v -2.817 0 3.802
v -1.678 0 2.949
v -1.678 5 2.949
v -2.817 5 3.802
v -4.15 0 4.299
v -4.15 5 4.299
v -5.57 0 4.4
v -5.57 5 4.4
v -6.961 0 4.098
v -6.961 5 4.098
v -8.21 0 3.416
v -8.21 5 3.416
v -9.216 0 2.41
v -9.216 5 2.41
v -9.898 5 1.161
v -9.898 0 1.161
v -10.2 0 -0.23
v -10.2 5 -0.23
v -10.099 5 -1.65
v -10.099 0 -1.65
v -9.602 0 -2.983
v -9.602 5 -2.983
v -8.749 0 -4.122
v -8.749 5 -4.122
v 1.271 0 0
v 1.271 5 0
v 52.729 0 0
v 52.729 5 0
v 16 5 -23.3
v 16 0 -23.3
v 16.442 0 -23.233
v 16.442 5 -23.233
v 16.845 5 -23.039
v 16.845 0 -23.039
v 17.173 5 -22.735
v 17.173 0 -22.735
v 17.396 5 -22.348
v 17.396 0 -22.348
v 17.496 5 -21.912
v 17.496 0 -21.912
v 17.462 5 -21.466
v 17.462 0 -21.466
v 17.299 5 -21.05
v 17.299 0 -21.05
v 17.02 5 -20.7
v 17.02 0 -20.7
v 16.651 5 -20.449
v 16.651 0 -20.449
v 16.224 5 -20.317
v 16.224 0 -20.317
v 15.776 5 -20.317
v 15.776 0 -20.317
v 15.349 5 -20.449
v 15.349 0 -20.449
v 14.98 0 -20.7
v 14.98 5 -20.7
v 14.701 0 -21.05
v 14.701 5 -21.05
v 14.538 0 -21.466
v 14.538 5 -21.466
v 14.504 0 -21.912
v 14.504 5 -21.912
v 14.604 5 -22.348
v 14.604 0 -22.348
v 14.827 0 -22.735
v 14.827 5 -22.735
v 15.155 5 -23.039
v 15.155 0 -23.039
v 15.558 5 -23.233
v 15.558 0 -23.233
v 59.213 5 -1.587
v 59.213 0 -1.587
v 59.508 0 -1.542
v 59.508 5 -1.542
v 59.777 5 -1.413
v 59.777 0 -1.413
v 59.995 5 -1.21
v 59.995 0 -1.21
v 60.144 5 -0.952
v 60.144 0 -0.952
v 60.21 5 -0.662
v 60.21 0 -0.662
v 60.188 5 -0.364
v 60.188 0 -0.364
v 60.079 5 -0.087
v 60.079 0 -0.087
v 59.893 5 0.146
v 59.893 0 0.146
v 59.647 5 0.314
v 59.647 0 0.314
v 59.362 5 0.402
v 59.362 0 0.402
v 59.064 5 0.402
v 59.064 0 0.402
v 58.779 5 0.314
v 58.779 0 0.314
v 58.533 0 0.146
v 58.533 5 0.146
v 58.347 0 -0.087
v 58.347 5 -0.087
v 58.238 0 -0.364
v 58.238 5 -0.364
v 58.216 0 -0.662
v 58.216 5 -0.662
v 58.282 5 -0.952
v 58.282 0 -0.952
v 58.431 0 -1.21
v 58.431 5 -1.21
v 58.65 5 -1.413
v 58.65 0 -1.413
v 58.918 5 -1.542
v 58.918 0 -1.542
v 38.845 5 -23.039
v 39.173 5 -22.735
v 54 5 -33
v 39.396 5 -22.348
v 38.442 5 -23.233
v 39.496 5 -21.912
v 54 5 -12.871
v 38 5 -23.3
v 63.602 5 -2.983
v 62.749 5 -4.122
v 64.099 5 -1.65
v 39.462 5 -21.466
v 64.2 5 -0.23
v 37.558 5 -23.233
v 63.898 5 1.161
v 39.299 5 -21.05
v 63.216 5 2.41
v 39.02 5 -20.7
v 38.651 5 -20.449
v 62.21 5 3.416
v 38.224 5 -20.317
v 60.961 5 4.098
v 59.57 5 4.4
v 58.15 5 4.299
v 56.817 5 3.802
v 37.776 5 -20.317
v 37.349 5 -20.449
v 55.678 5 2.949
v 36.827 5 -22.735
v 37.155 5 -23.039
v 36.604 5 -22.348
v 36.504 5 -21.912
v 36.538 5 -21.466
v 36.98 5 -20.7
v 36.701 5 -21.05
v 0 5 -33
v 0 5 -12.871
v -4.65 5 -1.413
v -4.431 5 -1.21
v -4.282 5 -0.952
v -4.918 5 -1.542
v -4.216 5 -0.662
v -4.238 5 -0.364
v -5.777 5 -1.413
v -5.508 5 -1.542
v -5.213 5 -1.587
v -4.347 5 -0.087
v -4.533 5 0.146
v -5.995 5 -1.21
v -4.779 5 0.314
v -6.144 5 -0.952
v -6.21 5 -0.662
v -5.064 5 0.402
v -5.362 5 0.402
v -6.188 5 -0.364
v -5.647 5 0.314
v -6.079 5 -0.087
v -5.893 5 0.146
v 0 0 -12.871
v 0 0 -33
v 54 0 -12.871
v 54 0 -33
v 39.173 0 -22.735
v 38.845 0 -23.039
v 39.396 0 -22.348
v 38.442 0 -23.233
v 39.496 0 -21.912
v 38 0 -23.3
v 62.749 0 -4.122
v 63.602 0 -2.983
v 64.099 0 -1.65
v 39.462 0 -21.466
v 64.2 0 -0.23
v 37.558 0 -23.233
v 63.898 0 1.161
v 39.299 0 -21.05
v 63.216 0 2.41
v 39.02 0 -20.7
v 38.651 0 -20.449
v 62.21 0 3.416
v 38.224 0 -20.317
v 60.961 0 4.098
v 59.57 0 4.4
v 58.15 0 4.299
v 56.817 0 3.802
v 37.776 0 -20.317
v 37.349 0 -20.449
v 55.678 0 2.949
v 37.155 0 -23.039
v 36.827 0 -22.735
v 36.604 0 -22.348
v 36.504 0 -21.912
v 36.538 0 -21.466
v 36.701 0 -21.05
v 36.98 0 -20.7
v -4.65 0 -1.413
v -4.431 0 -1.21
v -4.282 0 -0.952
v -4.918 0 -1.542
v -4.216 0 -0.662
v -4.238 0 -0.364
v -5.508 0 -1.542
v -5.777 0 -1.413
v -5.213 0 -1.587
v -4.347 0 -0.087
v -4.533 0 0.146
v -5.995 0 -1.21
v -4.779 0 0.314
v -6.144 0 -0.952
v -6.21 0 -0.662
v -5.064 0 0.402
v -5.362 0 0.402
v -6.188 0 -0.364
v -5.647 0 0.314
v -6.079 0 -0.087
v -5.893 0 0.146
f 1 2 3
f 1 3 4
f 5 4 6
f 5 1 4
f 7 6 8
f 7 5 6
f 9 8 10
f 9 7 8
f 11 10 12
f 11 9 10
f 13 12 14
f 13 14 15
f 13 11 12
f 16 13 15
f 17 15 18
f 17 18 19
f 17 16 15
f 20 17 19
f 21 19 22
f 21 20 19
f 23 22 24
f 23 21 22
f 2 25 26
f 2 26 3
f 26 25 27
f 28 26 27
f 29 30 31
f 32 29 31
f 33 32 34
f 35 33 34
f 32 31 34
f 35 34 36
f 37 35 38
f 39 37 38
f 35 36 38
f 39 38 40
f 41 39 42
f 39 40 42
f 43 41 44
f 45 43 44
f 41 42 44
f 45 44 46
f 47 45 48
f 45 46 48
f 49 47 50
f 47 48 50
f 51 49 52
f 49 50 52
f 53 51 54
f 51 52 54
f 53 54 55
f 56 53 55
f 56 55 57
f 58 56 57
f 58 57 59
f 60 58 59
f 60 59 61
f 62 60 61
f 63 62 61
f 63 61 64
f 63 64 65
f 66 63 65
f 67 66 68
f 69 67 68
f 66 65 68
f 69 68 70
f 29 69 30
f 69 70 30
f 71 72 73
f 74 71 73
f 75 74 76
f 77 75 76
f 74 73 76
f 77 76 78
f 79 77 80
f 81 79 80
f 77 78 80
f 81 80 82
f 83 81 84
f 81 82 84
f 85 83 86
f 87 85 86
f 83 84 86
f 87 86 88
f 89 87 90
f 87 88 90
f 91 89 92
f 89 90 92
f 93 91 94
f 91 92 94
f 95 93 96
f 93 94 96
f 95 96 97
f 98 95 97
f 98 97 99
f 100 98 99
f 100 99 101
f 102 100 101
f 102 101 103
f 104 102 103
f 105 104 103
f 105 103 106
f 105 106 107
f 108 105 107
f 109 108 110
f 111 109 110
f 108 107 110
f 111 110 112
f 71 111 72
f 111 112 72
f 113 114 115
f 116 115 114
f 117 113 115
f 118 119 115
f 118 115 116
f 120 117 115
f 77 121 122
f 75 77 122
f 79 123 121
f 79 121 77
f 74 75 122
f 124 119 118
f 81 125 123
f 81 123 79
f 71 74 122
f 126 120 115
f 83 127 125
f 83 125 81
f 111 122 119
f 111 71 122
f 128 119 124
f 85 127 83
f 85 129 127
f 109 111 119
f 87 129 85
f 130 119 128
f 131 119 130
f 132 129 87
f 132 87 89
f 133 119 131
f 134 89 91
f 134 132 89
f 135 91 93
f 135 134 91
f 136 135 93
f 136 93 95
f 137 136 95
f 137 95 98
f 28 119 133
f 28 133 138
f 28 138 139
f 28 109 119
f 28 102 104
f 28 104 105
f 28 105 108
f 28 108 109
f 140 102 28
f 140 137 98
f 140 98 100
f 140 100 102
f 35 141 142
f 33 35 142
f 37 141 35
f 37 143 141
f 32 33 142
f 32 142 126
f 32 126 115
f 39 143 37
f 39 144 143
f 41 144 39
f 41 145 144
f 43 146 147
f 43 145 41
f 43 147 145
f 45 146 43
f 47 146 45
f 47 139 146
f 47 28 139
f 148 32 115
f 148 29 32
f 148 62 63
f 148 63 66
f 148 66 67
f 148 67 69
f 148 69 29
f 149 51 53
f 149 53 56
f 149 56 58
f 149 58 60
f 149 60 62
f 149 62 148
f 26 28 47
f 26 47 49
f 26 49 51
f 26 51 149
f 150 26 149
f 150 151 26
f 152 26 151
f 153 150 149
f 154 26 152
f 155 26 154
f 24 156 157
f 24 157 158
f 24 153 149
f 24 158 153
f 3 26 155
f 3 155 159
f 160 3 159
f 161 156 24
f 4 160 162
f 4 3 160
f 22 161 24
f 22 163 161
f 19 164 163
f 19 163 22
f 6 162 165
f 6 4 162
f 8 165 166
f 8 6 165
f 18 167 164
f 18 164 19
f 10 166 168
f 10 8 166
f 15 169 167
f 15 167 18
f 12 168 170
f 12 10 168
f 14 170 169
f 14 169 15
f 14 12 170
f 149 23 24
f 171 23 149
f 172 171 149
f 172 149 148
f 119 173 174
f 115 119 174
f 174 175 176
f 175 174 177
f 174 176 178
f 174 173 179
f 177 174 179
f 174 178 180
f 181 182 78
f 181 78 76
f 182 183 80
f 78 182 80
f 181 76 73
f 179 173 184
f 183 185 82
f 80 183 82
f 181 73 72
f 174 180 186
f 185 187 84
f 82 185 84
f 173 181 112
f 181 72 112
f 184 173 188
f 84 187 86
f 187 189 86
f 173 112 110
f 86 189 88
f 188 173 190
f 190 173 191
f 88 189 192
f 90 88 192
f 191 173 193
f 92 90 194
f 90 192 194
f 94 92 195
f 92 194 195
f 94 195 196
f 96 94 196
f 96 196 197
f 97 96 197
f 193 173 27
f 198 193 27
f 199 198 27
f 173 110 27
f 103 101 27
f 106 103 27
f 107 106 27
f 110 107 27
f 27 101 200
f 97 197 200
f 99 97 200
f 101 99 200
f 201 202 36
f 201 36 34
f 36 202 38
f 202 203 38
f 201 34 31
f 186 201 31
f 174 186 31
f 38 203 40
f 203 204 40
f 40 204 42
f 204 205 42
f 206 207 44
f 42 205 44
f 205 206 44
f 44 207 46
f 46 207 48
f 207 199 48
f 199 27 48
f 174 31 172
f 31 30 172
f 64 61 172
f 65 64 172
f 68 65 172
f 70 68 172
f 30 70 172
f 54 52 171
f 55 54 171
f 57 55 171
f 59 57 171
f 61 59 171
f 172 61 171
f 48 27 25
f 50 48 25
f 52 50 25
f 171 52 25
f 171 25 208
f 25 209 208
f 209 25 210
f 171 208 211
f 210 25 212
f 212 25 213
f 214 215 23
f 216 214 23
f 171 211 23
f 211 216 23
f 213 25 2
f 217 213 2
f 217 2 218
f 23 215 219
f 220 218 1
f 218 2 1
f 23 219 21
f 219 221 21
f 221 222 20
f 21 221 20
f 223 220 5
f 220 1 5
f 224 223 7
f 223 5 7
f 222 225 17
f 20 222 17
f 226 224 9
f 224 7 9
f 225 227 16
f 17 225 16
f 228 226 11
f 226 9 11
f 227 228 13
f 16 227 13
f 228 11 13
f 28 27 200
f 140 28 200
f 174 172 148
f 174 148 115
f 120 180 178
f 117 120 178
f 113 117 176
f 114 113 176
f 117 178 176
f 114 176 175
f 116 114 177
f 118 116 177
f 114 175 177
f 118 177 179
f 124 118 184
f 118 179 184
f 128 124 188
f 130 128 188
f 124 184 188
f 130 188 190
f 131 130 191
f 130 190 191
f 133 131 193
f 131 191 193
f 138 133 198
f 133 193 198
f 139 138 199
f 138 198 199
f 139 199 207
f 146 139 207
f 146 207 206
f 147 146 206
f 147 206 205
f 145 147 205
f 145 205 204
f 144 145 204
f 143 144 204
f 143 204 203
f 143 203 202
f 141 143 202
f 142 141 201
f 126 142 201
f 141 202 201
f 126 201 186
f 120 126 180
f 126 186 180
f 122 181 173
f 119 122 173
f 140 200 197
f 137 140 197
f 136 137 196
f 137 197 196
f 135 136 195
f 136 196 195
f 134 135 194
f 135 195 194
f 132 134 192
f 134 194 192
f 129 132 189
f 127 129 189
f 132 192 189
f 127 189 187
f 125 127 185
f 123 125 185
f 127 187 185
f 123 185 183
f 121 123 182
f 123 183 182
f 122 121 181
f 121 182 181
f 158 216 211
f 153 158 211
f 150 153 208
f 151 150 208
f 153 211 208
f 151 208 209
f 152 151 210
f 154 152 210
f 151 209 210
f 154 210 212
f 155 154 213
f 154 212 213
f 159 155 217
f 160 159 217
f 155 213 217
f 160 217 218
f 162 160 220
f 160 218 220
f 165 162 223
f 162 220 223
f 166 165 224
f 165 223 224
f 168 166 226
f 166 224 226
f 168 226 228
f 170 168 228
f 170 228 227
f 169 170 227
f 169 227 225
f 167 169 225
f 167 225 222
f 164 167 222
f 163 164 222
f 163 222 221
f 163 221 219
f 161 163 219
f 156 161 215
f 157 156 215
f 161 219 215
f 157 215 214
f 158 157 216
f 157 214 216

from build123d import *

# Parameters (mm, degrees)
SKETCH1_W           = 54
SKETCH1_H           = 33
BOSS_EXTRUDE1_DEPTH = 5
SKETCH4_R           = 1
BOSS_EXTRUDE2_DEPTH = 5
SKETCH6_R           = 1.5
CUT_EXTRUDE1_DEPTH  = 5


with BuildPart() as part:
    # Sketch1 → Boss-Extrude1 (new body)
    with BuildSketch(Plane(origin=(0, 0, 0), x_dir=(1, 0, 0), z_dir=(0, 1, 0))):
        with Locations((27, 16.5)):
            Rectangle(SKETCH1_W, SKETCH1_H)
    extrude(amount=BOSS_EXTRUDE1_DEPTH)

    # Sketch4 → Boss-Extrude2 (add)
    # profile 1 of 2: a face of its own
    with BuildSketch(Plane.XZ):
        with BuildLine():
            Line((62.748737342, -4.12233047), (54, -12.871067812))
            Line((54, -12.871067812), (54, 0))
            Line((54, 0), (52.728932188, 0))
            Line((52.728932188, 0), (55.67766953, 2.948737342))
            ThreePointArc((55.67766953, 2.948737342), (62.748737342, 2.948737342), (62.748737342, -4.12233047))
        make_face()
        with Locations(Location((59.213203436, -0.586796564, 0), (0, 0, 270))):
            Circle(SKETCH4_R, mode=Mode.SUBTRACT)
    # profile 2 of 2: a face of its own
    with BuildSketch(Plane.XZ):
        with BuildLine():
            Line((-8.748737342, -4.12233047), (0, -12.871067812))
            Line((0, -12.871067812), (0, 0))
            Line((0, 0), (1.271067812, 0))
            Line((1.271067812, 0), (-1.67766953, 2.948737342))
            ThreePointArc((-1.67766953, 2.948737342), (-8.748737342, 2.948737342), (-8.748737342, -4.12233047))
        make_face()
        with Locations(Location((-5.213203436, -0.586796564, 0), (0, 0, 270))):
            Circle(SKETCH4_R, mode=Mode.SUBTRACT)
    extrude(amount=-BOSS_EXTRUDE2_DEPTH)

    # Sketch6 → Cut-Extrude1 (cut)
    with BuildSketch(Plane.XZ):
        with Locations(Location((38, -21.8, 0), (0, 0, 270))):
            Circle(SKETCH6_R)
        with Locations(Location((16, -21.8, 0), (0, 0, 270))):
            Circle(SKETCH6_R)
    extrude(amount=-CUT_EXTRUDE1_DEPTH, mode=Mode.SUBTRACT)


solid = part.part
